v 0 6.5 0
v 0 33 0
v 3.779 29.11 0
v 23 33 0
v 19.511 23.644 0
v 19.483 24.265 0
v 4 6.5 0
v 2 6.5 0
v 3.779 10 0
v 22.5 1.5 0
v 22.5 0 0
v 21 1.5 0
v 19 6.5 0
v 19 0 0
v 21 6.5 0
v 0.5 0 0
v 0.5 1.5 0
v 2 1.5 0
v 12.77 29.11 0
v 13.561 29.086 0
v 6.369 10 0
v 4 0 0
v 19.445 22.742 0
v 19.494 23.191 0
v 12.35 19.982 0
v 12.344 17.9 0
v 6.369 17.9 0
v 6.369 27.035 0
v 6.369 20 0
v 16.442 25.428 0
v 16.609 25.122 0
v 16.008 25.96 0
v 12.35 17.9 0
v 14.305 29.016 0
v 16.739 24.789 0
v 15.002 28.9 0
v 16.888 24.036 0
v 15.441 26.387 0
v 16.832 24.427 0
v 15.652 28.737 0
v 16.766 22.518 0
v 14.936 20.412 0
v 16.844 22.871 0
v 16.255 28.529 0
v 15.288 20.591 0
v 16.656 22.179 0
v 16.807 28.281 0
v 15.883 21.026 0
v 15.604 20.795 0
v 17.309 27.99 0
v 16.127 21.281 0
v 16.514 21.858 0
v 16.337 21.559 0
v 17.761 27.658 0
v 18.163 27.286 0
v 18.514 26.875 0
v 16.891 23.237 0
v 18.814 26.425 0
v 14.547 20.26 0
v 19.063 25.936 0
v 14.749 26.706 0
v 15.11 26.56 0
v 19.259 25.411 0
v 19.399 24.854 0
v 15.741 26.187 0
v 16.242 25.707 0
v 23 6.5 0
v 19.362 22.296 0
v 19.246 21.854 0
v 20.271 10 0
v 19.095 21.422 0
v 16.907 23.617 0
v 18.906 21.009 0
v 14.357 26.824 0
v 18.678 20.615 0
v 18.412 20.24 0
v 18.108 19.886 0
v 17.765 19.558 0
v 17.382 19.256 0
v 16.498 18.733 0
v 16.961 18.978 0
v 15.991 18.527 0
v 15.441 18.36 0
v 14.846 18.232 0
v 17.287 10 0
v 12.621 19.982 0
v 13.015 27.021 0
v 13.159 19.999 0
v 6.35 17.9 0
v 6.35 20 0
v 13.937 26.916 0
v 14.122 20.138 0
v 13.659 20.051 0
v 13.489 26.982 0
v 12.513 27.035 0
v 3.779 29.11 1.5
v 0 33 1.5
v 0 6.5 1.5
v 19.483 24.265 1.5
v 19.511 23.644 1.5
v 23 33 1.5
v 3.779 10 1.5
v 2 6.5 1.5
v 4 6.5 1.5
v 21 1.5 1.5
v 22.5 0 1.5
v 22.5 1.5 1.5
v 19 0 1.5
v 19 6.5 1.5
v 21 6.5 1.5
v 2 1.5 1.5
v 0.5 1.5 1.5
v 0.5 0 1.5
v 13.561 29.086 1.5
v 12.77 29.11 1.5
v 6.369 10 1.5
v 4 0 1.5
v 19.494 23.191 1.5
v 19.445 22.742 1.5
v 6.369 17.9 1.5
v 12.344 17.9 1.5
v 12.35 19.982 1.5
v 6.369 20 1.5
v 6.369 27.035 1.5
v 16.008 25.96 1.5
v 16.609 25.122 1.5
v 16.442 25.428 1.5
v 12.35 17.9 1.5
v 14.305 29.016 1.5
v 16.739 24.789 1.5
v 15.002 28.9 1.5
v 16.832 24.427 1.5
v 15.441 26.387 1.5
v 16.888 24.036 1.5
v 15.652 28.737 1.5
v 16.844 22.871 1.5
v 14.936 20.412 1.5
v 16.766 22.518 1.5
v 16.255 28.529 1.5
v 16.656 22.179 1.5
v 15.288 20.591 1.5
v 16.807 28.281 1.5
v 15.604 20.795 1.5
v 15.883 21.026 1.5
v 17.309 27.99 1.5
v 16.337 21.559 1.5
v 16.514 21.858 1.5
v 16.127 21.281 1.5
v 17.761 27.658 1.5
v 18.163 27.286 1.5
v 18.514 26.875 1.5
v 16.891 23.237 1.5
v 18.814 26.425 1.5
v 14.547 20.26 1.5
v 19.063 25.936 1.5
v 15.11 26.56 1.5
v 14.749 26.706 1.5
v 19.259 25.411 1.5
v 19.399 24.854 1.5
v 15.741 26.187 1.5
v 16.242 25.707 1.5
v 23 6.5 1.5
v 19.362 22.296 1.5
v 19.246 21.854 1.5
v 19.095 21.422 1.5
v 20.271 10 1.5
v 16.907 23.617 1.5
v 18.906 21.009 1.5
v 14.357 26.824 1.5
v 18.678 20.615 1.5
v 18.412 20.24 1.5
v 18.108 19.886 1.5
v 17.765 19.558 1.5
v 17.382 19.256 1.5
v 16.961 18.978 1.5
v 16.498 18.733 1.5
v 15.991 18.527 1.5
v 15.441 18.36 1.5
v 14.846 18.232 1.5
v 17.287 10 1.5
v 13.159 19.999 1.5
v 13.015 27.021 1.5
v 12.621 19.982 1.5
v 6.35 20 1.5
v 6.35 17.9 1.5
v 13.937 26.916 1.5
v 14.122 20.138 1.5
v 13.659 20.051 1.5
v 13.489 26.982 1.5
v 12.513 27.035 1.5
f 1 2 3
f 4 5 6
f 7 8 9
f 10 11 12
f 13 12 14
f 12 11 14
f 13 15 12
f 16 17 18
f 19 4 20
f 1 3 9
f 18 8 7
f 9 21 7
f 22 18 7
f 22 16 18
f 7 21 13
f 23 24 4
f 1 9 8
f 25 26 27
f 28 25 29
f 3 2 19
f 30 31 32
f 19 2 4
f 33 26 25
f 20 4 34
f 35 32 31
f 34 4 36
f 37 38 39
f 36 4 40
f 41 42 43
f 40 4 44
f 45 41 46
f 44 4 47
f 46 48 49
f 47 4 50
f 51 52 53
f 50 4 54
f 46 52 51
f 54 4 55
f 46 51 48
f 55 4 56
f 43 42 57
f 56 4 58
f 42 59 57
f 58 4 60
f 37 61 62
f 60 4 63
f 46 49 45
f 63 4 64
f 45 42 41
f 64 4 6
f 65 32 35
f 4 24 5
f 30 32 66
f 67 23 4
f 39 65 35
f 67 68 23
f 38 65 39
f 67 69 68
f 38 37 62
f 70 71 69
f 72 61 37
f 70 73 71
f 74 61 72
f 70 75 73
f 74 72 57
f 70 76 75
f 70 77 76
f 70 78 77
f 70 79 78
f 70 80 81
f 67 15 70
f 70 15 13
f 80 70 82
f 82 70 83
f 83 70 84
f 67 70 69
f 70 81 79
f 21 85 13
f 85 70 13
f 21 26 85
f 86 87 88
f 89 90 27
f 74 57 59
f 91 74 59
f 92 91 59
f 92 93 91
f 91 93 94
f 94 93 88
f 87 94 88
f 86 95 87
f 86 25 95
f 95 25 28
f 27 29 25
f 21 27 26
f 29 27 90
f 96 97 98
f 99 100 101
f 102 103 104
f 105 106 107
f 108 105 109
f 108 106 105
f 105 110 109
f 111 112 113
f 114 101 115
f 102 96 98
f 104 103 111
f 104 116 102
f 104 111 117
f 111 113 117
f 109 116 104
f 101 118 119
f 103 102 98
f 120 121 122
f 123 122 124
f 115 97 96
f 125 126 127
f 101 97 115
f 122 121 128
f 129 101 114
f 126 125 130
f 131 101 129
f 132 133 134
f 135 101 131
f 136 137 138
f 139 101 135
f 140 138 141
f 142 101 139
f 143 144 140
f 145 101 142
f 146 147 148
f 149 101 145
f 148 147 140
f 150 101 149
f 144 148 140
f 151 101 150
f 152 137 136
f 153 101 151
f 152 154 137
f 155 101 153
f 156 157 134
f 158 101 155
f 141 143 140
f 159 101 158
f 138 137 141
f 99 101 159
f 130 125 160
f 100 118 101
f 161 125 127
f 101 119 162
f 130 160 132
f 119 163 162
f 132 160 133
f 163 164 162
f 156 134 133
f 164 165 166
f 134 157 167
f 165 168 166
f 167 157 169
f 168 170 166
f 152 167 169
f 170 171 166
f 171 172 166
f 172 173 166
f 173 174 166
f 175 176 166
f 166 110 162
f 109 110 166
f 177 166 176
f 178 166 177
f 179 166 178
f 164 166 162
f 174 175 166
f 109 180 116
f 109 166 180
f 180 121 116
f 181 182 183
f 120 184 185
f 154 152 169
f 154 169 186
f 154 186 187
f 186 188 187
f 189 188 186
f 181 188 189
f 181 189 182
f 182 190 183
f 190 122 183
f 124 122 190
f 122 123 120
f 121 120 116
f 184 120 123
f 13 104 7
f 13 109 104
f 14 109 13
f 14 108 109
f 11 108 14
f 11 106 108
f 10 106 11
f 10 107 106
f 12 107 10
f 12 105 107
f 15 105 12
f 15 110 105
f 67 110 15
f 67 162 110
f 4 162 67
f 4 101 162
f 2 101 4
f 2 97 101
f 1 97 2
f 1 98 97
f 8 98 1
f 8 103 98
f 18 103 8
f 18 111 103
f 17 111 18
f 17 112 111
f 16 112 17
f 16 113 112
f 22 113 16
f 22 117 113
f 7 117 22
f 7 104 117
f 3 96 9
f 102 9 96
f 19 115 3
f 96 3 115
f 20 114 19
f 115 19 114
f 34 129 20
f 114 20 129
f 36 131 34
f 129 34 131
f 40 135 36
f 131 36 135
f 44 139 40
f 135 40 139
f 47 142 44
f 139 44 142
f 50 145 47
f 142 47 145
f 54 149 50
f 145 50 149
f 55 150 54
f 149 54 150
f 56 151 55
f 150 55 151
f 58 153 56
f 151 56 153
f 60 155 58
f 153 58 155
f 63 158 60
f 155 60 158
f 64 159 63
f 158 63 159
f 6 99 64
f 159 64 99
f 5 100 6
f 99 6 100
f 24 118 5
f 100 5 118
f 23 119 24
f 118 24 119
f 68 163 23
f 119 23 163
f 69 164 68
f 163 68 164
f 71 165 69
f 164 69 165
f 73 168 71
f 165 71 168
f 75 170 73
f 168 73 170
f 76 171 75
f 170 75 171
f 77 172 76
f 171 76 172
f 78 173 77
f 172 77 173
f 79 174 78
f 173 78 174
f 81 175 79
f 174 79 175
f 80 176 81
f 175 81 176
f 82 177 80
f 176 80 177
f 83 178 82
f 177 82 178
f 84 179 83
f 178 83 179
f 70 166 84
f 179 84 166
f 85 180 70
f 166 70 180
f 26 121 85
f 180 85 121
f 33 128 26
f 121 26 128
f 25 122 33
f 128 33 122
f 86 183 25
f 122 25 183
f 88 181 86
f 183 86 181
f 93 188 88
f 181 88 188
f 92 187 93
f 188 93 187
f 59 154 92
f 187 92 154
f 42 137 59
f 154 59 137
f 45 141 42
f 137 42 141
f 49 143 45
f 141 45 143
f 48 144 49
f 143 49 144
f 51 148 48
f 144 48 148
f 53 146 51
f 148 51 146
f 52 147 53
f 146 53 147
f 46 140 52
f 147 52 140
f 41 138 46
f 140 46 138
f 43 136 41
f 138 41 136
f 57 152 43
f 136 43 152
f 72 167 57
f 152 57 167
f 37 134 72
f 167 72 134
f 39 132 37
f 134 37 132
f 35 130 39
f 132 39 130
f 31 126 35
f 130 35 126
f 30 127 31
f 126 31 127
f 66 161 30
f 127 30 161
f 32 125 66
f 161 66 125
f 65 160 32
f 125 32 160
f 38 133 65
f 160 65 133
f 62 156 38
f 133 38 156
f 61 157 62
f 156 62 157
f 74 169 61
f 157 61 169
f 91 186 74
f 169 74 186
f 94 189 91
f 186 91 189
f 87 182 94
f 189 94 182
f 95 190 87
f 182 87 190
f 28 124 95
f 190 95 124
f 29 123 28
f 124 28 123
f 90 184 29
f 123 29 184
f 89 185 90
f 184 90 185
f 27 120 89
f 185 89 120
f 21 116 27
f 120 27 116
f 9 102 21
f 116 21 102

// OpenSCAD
// file: _action_card_module.scad
module 2d_action_card(letter, letter_offset) {
    width=23;
    height=33;
    difference() {
            square([width, height]);
            translate([-1, 1.5, 0]) square([3, 5]);
            translate([-1, -1, 0]) square([1.5, 4]);
            translate([4, -1.5, 0]) square([width-8, 8]);
            translate([width-2, 1.5, 0]) square([3, 5]);
            translate([width-0.5, -1, 0]) square([2, 4]);
            translate([letter_offset, 10, 0]) text(letter, 20);
        }
}
// main file
include <_action_card_module.scad>;

linear_extrude(1.5) {
    union() {
        2d_action_card("R", 1.5);
        translate([6.35,17.9,0]) square([6,2.1]);
    }
}
